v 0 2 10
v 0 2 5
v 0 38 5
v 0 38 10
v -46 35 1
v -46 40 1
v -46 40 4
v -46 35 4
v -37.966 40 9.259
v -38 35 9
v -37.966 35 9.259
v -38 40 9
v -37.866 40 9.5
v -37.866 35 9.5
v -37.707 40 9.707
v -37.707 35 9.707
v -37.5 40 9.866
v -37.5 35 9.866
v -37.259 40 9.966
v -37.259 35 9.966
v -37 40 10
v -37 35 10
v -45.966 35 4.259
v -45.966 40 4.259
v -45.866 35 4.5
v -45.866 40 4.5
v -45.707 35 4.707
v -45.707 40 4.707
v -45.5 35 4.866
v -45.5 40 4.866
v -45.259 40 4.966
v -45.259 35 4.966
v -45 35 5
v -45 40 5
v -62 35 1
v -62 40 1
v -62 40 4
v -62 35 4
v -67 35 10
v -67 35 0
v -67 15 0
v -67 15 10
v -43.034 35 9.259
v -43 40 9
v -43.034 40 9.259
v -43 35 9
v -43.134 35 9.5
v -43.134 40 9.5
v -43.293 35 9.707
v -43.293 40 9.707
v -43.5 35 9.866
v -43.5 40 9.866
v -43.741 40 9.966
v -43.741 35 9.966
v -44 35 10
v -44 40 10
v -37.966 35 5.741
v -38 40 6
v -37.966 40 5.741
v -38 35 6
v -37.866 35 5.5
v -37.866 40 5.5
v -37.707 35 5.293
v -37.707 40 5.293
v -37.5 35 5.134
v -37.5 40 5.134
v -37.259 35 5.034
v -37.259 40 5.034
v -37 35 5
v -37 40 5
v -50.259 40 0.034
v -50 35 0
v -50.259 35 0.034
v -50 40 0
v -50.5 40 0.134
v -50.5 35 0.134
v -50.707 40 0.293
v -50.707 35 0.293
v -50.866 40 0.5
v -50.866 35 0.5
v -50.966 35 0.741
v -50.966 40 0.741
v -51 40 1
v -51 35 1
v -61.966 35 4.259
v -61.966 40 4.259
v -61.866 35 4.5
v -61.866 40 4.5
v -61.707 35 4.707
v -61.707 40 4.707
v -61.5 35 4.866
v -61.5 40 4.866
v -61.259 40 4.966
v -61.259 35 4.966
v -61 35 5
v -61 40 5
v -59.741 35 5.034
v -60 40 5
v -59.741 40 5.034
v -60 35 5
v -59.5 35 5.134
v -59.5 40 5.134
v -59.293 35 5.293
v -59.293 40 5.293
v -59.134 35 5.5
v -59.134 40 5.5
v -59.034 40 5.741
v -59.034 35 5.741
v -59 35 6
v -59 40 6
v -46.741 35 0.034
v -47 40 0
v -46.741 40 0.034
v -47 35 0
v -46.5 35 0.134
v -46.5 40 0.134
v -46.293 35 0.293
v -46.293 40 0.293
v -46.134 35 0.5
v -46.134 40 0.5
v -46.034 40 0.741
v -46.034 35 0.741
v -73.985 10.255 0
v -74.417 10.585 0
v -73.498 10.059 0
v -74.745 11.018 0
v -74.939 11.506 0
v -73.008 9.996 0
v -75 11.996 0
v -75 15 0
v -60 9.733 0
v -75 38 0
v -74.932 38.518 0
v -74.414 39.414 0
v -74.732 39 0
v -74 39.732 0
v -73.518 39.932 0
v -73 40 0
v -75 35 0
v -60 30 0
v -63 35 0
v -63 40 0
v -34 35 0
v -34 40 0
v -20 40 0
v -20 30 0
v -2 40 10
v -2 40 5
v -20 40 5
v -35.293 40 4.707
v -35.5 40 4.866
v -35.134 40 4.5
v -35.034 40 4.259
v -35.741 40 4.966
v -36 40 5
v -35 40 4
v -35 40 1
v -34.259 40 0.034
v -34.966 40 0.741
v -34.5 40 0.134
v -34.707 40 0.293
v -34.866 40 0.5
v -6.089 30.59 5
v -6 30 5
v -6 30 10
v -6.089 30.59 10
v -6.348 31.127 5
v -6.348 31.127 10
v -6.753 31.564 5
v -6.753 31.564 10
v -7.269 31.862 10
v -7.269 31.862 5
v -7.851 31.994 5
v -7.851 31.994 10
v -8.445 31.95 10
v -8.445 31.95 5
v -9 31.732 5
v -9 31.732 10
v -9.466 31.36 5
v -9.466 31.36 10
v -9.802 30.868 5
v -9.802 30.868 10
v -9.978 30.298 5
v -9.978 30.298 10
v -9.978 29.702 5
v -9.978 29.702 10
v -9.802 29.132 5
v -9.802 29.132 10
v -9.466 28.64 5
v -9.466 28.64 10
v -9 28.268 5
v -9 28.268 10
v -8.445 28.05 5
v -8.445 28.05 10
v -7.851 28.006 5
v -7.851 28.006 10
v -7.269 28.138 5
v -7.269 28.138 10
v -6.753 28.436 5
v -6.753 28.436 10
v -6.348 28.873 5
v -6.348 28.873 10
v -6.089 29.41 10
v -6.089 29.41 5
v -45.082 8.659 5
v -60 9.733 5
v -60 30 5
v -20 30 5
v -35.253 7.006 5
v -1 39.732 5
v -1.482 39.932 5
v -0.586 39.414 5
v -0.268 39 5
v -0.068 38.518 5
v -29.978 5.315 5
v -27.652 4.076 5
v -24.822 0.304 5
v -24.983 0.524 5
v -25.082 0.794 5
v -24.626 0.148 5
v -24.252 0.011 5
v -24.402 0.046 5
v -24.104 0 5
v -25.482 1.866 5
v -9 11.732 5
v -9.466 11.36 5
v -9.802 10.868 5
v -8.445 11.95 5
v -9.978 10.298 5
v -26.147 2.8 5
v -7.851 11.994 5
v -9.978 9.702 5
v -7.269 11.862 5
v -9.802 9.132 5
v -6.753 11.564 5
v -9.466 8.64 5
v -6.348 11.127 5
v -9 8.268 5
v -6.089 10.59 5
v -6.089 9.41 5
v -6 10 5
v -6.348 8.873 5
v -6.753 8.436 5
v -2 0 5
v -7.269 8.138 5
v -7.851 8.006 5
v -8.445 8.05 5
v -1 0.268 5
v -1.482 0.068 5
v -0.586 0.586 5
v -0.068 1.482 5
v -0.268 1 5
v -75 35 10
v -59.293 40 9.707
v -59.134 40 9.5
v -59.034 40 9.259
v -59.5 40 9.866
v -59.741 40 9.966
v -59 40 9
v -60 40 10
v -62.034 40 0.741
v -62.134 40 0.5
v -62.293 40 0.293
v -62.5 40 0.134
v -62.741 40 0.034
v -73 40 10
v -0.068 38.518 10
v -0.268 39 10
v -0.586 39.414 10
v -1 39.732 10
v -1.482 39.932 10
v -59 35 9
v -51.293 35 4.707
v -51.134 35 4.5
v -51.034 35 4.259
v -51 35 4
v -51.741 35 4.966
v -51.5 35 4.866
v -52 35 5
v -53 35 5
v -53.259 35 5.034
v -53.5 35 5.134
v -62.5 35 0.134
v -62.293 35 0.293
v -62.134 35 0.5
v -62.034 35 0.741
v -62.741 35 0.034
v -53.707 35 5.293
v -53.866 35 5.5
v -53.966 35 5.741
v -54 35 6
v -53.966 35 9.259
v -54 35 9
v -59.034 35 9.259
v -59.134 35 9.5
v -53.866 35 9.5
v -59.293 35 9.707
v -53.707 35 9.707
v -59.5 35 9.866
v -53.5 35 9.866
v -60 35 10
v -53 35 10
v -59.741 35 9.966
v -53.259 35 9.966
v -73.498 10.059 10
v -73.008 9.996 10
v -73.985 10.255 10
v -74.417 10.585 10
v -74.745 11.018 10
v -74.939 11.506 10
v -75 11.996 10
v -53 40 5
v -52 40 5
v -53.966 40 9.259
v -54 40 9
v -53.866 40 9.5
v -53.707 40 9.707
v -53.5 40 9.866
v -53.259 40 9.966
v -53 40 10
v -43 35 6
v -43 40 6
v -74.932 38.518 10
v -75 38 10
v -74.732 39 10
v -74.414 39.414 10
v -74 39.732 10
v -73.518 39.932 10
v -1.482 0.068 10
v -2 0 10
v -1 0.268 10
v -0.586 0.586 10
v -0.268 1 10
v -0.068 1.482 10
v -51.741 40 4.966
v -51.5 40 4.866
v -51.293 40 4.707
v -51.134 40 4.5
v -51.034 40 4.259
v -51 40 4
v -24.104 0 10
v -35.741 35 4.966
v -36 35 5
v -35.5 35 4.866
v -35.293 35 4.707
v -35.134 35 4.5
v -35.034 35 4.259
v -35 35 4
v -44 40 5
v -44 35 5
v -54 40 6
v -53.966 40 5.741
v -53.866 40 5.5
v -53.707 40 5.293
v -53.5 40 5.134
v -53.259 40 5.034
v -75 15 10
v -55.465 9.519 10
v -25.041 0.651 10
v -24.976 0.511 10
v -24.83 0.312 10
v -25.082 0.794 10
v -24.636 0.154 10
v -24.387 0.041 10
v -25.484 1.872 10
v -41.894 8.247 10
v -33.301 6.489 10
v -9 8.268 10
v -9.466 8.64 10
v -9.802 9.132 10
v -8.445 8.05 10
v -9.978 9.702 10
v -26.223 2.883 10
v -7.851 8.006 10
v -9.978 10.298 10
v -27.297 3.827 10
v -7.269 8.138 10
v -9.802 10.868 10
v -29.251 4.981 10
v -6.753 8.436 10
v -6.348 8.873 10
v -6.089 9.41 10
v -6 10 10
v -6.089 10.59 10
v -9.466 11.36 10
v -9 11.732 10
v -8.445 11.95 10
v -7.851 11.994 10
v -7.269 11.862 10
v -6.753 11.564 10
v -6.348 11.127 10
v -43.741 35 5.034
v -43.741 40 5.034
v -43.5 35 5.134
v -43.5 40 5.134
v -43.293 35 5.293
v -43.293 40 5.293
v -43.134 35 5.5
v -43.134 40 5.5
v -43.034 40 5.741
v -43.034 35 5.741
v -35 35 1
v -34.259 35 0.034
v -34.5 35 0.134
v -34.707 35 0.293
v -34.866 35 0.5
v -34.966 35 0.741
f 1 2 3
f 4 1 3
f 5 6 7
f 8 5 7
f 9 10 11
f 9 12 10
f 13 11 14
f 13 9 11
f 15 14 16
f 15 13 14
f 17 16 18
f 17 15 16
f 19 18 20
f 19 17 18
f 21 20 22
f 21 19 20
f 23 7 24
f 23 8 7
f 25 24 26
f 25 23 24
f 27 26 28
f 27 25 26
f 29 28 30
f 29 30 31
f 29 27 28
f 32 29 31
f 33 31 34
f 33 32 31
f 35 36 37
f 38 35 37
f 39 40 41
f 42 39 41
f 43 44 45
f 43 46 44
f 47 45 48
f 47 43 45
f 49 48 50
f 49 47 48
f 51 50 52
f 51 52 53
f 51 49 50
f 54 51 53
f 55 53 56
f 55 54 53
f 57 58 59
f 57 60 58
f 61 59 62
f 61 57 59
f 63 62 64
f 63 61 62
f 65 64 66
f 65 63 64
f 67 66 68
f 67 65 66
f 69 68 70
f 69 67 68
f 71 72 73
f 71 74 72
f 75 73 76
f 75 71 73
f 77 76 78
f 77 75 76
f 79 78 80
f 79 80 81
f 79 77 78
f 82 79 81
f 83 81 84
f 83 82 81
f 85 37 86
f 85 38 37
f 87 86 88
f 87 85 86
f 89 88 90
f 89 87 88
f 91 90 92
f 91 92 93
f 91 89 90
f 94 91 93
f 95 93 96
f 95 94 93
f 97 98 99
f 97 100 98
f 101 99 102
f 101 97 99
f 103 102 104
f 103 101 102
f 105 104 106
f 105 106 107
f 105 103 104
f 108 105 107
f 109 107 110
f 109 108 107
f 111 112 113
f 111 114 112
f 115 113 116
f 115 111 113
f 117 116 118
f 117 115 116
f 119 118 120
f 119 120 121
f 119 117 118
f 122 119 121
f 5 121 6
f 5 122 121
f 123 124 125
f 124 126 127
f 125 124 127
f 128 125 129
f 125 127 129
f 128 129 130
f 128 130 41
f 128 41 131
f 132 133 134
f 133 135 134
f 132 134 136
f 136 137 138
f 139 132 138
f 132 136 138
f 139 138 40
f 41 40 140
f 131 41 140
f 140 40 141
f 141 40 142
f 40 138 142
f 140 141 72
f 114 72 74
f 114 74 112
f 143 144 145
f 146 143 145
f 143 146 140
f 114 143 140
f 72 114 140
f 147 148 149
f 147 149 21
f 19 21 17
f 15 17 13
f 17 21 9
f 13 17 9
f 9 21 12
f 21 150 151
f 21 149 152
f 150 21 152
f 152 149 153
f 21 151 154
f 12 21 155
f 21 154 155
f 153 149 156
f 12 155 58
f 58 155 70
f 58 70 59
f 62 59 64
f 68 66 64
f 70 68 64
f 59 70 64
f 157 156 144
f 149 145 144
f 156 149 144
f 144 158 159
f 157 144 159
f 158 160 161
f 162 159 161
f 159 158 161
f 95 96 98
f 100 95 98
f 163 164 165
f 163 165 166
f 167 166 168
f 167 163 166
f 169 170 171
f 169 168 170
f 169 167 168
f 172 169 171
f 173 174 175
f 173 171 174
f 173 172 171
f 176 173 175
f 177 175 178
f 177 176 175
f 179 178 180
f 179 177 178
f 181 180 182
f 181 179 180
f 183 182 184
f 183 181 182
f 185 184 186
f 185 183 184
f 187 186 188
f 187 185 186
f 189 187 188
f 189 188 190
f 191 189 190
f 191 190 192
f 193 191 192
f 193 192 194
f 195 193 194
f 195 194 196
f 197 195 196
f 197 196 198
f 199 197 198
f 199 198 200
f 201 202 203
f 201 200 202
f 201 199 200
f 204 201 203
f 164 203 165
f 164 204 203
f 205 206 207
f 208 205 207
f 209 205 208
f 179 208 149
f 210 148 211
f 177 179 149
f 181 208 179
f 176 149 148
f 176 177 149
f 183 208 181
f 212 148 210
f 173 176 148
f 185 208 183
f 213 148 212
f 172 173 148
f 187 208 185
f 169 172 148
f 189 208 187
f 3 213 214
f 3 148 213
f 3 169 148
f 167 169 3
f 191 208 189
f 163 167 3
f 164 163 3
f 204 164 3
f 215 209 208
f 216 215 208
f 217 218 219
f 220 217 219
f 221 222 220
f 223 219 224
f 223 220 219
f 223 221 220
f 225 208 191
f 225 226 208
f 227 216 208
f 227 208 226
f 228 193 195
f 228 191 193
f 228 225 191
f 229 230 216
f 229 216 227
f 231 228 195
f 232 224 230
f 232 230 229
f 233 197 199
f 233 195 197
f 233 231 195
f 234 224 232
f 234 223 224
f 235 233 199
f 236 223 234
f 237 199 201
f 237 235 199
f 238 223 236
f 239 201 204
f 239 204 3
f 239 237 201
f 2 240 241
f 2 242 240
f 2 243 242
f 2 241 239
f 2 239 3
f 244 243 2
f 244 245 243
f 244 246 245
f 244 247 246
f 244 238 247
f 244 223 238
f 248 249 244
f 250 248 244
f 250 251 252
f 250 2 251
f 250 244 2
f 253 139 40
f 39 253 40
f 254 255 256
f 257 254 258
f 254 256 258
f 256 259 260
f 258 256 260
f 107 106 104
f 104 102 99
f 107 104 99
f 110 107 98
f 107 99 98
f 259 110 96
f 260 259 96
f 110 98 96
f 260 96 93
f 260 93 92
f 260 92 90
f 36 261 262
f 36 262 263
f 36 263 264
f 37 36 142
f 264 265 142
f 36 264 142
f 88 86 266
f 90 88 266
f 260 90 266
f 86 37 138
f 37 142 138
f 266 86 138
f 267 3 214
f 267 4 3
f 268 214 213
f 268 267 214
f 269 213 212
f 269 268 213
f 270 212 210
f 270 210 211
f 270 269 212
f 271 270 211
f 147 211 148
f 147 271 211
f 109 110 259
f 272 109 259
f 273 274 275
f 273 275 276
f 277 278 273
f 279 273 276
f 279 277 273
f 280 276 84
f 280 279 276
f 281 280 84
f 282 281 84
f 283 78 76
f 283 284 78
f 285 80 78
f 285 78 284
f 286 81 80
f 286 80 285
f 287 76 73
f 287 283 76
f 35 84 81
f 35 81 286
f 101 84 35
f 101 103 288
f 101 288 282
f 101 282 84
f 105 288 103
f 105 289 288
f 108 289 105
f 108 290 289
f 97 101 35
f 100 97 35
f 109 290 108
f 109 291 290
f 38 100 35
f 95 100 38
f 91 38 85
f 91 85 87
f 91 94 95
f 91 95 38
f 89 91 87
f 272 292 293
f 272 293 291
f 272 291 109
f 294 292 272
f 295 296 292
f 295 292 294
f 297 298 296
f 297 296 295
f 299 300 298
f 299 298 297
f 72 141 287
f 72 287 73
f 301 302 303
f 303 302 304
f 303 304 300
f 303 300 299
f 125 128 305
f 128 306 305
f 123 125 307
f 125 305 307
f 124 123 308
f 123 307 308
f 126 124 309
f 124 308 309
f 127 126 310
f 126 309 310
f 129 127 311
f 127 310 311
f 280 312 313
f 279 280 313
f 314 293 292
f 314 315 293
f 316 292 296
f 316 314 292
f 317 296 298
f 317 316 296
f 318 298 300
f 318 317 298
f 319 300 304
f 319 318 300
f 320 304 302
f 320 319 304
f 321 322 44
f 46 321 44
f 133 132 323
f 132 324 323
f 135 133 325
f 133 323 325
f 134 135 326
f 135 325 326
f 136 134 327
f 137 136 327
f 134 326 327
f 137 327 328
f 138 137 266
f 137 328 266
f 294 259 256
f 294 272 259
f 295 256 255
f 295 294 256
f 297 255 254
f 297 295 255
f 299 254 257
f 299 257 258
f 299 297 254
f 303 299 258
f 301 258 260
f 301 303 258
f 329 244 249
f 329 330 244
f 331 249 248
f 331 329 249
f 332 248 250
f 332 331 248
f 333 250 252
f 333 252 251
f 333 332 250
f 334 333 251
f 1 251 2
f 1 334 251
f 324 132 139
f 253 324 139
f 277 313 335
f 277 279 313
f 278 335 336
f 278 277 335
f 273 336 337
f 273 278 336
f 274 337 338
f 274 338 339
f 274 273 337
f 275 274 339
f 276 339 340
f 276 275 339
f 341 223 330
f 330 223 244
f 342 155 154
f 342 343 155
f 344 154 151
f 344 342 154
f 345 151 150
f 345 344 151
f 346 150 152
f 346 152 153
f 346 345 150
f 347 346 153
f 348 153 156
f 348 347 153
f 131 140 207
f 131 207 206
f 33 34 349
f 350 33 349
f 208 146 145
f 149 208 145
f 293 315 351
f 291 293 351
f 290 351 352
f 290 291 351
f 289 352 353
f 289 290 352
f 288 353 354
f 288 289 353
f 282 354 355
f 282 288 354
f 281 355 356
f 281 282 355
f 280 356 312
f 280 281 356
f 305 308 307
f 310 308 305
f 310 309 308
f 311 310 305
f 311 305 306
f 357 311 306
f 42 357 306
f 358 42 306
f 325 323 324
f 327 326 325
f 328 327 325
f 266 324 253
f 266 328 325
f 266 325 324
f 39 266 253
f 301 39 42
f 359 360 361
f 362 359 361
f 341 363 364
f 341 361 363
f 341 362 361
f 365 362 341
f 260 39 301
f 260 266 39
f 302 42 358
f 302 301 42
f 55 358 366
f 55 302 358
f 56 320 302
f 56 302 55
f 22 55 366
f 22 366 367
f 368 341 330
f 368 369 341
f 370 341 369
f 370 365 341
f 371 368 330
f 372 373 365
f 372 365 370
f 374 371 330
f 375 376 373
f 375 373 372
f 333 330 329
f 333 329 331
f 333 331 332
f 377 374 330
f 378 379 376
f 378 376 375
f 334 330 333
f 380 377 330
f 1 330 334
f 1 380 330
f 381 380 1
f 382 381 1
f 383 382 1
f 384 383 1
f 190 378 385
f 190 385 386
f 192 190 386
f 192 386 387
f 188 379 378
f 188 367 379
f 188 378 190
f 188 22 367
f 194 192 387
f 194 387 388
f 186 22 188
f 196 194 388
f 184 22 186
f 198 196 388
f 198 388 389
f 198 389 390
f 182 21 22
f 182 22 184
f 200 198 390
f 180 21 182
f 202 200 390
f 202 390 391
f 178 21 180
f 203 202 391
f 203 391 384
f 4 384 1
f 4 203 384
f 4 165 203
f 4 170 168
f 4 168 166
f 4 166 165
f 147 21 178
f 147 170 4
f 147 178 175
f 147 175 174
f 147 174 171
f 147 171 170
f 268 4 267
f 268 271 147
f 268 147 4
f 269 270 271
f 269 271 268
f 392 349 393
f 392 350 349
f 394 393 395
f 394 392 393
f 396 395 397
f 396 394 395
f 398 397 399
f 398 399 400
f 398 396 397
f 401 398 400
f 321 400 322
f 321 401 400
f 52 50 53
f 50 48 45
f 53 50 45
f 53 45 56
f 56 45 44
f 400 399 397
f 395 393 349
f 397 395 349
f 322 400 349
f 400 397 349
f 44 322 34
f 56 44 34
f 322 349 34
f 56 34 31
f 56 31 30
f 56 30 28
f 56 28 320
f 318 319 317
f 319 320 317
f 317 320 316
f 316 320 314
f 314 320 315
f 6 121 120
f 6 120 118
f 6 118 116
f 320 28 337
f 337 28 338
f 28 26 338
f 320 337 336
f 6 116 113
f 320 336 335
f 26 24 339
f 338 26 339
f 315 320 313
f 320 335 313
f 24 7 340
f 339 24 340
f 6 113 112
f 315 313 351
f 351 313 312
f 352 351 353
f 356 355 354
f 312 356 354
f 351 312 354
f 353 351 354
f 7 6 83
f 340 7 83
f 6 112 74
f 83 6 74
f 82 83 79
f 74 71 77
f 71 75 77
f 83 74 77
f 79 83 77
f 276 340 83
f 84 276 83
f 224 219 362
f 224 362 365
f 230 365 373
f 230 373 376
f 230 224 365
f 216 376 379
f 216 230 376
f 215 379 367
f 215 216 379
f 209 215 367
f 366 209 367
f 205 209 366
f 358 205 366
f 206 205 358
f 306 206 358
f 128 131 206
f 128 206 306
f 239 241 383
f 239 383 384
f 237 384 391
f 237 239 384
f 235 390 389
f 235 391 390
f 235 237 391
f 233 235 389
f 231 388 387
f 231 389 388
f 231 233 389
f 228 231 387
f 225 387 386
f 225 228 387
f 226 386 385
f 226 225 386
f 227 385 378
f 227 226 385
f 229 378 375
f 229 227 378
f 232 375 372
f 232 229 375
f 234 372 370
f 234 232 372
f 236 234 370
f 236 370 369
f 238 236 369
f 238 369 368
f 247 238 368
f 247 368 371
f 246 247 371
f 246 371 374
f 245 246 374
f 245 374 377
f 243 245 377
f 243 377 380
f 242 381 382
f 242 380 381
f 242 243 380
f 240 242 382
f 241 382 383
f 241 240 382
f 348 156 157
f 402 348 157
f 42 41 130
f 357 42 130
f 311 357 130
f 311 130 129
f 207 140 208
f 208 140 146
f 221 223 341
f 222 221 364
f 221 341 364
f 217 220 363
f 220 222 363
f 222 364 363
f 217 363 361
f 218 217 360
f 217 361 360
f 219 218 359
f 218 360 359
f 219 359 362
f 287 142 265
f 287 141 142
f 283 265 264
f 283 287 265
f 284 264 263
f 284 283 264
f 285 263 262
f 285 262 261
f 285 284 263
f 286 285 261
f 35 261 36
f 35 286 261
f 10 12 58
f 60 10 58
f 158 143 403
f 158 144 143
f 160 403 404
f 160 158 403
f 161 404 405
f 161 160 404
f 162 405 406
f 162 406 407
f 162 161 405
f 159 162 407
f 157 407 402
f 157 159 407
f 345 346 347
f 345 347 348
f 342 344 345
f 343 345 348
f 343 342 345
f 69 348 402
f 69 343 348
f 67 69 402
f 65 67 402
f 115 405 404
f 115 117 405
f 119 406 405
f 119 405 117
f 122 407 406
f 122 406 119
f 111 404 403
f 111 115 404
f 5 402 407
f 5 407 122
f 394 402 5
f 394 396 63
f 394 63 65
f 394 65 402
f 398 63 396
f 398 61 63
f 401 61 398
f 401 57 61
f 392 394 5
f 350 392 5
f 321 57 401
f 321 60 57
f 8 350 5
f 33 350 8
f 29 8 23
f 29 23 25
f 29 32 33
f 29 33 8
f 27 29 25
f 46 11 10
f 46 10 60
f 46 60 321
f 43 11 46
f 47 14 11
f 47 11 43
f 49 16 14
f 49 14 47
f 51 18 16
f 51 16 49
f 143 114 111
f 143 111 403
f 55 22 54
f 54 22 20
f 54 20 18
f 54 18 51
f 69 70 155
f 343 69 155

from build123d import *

# Parameters (mm, degrees)
PAD_DEPTH       = 10
SKETCH001_W     = 25
SKETCH001_H     = 50
POCKET_DEPTH    = 5
SKETCH002_R     = 2
POCKET001_DEPTH = 12
FILLET_R        = 2
FILLET001_R     = 1
POCKET002_DEPTH = 5
SKETCH004_W     = 40
SKETCH004_H     = 30
POCKET003_DEPTH = 5
FILLET002_R     = 1
FILLET003_R     = 1


with BuildPart() as part:
    # Sketch → Pad (new body)
    with BuildSketch(Plane.XY):
        with BuildLine():
            Line((-25, 0), (0, 0))
            Line((0, 0), (0, 40))
            Line((0, 40), (-75, 40))
            Line((-75, 40), (-75, 35))
            Line((-75, 35), (-67, 35))
            Line((-67, 35), (-67, 15))
            Line((-67, 15), (-75, 15))
            Line((-75, 15), (-75, 10))
            add(Edge.make_bspline(
                [(-25, 0), (-25, 10), (-75, 10)],
                knots=[0, 0, 0, 1, 1, 1], degree=2))
        make_face()
    extrude(amount=PAD_DEPTH)

    # Sketch001 → Pocket (cut)
    with BuildSketch(Plane.XY):
        with Locations((-7.5, 20)):
            Rectangle(SKETCH001_W, SKETCH001_H)
    extrude(amount=POCKET_DEPTH, mode=Mode.SUBTRACT)

    # Sketch002 → Pocket001 (cut)
    with BuildSketch(Plane.XY):
        with Locations((-8, 30)):
            Circle(SKETCH002_R)
        with Locations((-8, 10)):
            Circle(SKETCH002_R)
    extrude(amount=POCKET001_DEPTH, mode=Mode.SUBTRACT)

    # Fillet
    fillet_edges = [part.edges().sort_by_distance(p)[0] for p in [
        (0, 40, 7.5),
        (0, 0, 7.5),
        (-75, 10, 5),
        (-75, 40, 5),
    ]]
    fillet(fillet_edges, radius=FILLET_R)

    # Fillet001
    fillet001_edges = [part.edges().sort_by_distance(p)[0] for p in [
        (-25, 0, 5),
    ]]
    fillet(fillet001_edges, radius=FILLET001_R)

    # Sketch003 (on Face13 of Fillet001) → Pocket002 (cut)
    with BuildSketch(Plane(origin=(0, 40, 0), x_dir=(-1, 0, 0), z_dir=(0, 1, 0))):
        Polygon((62, -5), (62, 5), (59, 5), (59, 15), (54, 15), (54, 5), (51, 5), (51, -5), align=None)
        Polygon((46, -5), (46, 5), (43, 5), (43, 15), (38, 15), (38, 5), (35, 5), (35, -5), align=None)
    extrude(amount=-POCKET002_DEPTH, mode=Mode.SUBTRACT)

    # Sketch004 (on Face5 of Pocket002) → Pocket003 (cut)
    with BuildSketch(Plane(origin=(0, 0, 0), x_dir=(1, 0, 0), z_dir=(0, 0, -1))):
        with Locations((-40, -15)):
            Rectangle(SKETCH004_W, SKETCH004_H)
    extrude(amount=-POCKET003_DEPTH, mode=Mode.SUBTRACT)

    # Fillet002
    fillet002_edges = [part.edges().sort_by_distance(p)[0] for p in [
        (-62, 37.5, 5),
        (-59, 37.5, 5),
        (-46, 37.5, 5),
        (-43, 37.5, 5),
        (-43, 37.5, 10),
        (-59, 37.5, 10),
        (-54, 37.5, 5),
        (-38, 37.5, 5),
        (-35, 37.5, 5),
        (-51, 37.5, 5),
        (-54, 37.5, 10),
        (-38, 37.5, 10),
    ]]
    fillet(fillet002_edges, radius=FILLET002_R)

    # Fillet003
    fillet003_edges = [part.edges().sort_by_distance(p)[0] for p in [
        (-35, 37.5, 0),
        (-46, 37.5, 0),
        (-51, 37.5, 0),
        (-62, 37.5, 0),
    ]]
    fillet(fillet003_edges, radius=FILLET003_R)


solid = part.part
